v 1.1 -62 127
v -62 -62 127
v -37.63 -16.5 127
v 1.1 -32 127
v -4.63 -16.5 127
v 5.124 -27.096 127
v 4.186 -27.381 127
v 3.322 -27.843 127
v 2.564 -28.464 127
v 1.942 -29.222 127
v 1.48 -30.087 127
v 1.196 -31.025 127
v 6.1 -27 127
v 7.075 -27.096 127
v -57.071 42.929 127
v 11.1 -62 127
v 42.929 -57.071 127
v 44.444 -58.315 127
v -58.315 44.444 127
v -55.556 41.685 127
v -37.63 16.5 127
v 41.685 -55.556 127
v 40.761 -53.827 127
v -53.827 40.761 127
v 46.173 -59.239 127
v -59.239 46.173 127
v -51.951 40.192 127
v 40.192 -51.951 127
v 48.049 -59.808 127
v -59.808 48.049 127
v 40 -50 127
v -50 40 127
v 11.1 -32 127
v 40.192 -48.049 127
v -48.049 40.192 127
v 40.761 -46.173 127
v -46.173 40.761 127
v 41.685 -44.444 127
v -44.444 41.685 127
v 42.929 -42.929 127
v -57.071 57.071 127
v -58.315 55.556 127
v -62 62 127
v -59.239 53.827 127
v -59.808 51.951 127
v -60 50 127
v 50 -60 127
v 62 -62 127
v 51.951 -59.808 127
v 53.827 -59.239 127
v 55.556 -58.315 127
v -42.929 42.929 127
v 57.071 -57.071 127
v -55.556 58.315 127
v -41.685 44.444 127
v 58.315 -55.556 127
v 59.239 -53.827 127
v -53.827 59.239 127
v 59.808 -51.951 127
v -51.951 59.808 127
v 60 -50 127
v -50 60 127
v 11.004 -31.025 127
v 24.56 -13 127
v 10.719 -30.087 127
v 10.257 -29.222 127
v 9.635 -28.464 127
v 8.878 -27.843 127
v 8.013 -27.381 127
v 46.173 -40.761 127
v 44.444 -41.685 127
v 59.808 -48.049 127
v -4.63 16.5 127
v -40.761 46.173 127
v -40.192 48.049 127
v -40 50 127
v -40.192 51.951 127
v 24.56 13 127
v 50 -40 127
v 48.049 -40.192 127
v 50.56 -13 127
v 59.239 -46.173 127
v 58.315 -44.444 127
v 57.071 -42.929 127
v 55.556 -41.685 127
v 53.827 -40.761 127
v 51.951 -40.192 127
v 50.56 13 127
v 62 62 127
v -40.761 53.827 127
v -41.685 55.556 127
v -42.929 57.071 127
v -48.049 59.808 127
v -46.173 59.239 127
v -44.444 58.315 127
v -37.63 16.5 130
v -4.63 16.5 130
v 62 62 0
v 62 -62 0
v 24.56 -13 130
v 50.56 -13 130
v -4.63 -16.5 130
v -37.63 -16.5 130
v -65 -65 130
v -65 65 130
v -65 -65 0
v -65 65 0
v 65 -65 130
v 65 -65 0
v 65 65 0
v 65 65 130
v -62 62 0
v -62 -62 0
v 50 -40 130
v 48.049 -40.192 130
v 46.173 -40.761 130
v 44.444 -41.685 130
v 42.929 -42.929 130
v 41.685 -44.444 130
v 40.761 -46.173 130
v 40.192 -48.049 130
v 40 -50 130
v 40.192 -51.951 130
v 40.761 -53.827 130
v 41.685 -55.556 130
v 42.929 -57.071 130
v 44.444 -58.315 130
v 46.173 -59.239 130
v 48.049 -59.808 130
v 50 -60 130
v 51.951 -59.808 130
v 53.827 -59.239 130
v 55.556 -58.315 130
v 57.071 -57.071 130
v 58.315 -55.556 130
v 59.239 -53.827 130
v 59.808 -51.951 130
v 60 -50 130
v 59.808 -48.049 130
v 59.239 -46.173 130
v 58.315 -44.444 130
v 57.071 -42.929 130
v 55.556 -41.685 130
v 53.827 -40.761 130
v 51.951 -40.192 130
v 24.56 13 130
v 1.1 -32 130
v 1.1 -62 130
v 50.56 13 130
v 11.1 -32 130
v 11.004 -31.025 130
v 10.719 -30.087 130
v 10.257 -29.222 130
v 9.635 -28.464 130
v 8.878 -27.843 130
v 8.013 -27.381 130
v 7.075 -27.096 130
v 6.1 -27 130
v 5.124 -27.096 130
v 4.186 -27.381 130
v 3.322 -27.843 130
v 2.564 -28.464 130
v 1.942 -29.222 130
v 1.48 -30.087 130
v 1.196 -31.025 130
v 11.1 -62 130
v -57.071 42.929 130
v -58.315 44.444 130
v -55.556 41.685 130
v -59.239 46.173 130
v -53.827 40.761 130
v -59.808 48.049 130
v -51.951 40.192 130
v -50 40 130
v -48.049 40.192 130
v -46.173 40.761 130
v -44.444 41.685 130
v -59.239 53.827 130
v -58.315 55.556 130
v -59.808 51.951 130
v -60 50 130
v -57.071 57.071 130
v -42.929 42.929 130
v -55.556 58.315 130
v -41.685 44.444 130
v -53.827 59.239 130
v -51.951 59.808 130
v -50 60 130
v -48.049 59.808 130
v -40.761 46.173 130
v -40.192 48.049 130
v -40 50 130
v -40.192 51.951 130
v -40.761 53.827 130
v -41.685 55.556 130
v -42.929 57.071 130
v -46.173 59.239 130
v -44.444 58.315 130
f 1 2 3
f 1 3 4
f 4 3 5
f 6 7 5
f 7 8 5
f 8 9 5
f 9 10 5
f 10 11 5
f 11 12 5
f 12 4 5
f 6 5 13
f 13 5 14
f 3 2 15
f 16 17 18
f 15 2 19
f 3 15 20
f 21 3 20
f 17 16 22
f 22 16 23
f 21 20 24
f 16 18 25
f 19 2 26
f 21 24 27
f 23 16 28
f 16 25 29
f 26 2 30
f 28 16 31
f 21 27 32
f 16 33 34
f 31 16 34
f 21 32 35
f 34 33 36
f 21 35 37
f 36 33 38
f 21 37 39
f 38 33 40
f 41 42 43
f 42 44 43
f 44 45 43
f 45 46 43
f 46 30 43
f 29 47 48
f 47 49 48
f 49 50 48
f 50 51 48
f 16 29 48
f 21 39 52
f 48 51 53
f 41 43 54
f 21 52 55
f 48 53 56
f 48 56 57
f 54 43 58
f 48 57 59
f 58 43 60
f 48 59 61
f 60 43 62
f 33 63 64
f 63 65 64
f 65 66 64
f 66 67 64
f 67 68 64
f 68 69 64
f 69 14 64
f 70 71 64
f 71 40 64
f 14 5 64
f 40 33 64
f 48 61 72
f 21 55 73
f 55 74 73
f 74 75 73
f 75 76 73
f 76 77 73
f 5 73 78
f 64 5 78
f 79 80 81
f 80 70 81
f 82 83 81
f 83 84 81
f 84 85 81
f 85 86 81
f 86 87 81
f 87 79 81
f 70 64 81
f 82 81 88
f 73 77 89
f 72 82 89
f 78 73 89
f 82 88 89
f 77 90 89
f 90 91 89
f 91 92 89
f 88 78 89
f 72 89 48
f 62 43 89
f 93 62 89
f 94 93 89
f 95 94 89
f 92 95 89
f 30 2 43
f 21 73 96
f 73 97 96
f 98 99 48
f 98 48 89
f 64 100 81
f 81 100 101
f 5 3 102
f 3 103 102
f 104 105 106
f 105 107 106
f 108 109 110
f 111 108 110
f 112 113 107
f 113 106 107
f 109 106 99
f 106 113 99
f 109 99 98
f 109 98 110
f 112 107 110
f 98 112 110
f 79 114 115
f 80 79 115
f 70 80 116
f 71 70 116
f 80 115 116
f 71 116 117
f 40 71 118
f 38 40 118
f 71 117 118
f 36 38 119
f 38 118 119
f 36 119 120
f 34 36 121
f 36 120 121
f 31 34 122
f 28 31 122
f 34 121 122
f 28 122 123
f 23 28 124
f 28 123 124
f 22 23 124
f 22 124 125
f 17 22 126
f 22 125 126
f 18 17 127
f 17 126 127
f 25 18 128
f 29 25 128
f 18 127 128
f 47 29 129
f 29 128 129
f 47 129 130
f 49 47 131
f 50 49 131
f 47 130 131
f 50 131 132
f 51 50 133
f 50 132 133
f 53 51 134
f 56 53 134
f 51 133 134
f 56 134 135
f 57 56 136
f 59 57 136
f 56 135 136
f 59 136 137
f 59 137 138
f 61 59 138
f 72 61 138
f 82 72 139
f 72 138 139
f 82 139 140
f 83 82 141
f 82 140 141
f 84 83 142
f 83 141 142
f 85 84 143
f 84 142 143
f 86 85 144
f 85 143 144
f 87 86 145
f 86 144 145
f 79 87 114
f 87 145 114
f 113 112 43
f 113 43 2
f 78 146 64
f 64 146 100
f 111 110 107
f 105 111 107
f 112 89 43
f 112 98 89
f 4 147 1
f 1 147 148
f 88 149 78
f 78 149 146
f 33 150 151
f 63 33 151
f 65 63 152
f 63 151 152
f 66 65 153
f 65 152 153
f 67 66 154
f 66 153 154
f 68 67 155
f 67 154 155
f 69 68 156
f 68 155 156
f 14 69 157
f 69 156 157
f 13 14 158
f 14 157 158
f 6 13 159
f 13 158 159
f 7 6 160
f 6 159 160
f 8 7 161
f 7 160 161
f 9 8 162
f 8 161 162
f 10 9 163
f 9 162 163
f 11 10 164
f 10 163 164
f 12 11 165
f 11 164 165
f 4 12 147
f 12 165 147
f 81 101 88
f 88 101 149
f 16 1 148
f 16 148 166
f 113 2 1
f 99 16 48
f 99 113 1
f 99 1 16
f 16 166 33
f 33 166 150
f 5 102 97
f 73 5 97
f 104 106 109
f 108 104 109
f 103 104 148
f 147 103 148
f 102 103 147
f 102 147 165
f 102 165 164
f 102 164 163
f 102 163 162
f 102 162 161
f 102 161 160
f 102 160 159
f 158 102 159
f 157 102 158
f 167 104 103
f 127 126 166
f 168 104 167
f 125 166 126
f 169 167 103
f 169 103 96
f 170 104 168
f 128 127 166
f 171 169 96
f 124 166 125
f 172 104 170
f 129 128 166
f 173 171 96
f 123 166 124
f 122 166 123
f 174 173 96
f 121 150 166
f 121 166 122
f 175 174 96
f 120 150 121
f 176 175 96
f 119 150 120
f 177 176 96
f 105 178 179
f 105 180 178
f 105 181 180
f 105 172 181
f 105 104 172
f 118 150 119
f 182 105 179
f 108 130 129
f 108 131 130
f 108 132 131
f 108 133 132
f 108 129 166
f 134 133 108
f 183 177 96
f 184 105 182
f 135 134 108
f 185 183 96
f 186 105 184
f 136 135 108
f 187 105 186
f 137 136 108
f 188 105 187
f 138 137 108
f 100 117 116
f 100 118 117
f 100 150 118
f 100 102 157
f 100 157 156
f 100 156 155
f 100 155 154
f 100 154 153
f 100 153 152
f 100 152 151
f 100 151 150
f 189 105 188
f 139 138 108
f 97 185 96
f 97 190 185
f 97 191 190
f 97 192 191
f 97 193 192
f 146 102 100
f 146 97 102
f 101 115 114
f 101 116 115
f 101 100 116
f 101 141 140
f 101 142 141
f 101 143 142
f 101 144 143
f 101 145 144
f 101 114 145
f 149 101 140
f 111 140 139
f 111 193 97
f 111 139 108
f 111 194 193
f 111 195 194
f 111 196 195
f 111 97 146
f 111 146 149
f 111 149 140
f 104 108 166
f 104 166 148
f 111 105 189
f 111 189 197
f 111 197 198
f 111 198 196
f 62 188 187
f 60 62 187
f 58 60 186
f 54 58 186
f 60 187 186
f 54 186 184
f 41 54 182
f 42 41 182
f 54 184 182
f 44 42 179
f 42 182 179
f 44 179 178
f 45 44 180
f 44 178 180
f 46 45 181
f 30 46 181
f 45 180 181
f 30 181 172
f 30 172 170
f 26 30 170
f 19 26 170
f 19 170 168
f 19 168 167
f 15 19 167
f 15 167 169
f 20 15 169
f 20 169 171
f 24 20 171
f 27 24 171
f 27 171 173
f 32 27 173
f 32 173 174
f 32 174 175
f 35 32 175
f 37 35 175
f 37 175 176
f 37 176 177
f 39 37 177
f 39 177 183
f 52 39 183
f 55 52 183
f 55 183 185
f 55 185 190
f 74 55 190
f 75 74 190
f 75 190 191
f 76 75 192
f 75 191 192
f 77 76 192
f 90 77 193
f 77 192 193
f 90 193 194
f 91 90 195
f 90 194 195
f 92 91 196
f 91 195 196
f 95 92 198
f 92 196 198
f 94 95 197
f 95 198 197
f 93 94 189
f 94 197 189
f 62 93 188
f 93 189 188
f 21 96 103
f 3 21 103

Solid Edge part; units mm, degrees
sketch "Sketch1" plane through (0, 0, 0) normal (0, 0, 1) x (1, 0, 0)
  line L0 (-65, 65) -> (-65, -65)
  line L1 (-65, -65) -> (65, -65)
  line L2 (65, -65) -> (65, 65)
  line L3 (65, 65) -> (-65, 65)
extrude "Protrusion1" add sketch "Sketch1" along normal blind 130
shell "Thinwall_1" thickness 3 removed faces 1 at (-44.6333, -42.0333, 0)
sketch "Sketch2" plane through (0, 0, 130) normal (0, 0, 1) x (0, 1, 0)
  line L0 (-16.5, 37.6302) -> (-16.5, 4.6302)
  line L1 (-16.5, 4.6302) -> (16.5, 4.6302)
  line L2 (16.5, 4.6302) -> (16.5, 37.6302)
  line L3 (16.5, 37.6302) -> (-16.5, 37.6302)
  circle A0 centre (50, 50) radius 10
  line L4 (-62, -11.0997) -> (-32, -11.0997)
  line L5 (-32, -1.0997) -> (-62, -1.0997)
  line L6 (-62, -1.0997) -> (-62, -11.0997)
  arc A1 (-32, -1.0997) -> (-32, -11.0997) centre (-32, -6.0997) cw
  circle A2 centre (-50, -50) radius 10
  line L7 (-13, -24.56) -> (-13, -50.56)
  line L8 (-13, -50.56) -> (13, -50.56)
  line L9 (13, -50.56) -> (13, -24.56)
  line L10 (13, -24.56) -> (-13, -24.56)
extrude "Cutout1" cut sketch "Sketch2" against normal up to next
